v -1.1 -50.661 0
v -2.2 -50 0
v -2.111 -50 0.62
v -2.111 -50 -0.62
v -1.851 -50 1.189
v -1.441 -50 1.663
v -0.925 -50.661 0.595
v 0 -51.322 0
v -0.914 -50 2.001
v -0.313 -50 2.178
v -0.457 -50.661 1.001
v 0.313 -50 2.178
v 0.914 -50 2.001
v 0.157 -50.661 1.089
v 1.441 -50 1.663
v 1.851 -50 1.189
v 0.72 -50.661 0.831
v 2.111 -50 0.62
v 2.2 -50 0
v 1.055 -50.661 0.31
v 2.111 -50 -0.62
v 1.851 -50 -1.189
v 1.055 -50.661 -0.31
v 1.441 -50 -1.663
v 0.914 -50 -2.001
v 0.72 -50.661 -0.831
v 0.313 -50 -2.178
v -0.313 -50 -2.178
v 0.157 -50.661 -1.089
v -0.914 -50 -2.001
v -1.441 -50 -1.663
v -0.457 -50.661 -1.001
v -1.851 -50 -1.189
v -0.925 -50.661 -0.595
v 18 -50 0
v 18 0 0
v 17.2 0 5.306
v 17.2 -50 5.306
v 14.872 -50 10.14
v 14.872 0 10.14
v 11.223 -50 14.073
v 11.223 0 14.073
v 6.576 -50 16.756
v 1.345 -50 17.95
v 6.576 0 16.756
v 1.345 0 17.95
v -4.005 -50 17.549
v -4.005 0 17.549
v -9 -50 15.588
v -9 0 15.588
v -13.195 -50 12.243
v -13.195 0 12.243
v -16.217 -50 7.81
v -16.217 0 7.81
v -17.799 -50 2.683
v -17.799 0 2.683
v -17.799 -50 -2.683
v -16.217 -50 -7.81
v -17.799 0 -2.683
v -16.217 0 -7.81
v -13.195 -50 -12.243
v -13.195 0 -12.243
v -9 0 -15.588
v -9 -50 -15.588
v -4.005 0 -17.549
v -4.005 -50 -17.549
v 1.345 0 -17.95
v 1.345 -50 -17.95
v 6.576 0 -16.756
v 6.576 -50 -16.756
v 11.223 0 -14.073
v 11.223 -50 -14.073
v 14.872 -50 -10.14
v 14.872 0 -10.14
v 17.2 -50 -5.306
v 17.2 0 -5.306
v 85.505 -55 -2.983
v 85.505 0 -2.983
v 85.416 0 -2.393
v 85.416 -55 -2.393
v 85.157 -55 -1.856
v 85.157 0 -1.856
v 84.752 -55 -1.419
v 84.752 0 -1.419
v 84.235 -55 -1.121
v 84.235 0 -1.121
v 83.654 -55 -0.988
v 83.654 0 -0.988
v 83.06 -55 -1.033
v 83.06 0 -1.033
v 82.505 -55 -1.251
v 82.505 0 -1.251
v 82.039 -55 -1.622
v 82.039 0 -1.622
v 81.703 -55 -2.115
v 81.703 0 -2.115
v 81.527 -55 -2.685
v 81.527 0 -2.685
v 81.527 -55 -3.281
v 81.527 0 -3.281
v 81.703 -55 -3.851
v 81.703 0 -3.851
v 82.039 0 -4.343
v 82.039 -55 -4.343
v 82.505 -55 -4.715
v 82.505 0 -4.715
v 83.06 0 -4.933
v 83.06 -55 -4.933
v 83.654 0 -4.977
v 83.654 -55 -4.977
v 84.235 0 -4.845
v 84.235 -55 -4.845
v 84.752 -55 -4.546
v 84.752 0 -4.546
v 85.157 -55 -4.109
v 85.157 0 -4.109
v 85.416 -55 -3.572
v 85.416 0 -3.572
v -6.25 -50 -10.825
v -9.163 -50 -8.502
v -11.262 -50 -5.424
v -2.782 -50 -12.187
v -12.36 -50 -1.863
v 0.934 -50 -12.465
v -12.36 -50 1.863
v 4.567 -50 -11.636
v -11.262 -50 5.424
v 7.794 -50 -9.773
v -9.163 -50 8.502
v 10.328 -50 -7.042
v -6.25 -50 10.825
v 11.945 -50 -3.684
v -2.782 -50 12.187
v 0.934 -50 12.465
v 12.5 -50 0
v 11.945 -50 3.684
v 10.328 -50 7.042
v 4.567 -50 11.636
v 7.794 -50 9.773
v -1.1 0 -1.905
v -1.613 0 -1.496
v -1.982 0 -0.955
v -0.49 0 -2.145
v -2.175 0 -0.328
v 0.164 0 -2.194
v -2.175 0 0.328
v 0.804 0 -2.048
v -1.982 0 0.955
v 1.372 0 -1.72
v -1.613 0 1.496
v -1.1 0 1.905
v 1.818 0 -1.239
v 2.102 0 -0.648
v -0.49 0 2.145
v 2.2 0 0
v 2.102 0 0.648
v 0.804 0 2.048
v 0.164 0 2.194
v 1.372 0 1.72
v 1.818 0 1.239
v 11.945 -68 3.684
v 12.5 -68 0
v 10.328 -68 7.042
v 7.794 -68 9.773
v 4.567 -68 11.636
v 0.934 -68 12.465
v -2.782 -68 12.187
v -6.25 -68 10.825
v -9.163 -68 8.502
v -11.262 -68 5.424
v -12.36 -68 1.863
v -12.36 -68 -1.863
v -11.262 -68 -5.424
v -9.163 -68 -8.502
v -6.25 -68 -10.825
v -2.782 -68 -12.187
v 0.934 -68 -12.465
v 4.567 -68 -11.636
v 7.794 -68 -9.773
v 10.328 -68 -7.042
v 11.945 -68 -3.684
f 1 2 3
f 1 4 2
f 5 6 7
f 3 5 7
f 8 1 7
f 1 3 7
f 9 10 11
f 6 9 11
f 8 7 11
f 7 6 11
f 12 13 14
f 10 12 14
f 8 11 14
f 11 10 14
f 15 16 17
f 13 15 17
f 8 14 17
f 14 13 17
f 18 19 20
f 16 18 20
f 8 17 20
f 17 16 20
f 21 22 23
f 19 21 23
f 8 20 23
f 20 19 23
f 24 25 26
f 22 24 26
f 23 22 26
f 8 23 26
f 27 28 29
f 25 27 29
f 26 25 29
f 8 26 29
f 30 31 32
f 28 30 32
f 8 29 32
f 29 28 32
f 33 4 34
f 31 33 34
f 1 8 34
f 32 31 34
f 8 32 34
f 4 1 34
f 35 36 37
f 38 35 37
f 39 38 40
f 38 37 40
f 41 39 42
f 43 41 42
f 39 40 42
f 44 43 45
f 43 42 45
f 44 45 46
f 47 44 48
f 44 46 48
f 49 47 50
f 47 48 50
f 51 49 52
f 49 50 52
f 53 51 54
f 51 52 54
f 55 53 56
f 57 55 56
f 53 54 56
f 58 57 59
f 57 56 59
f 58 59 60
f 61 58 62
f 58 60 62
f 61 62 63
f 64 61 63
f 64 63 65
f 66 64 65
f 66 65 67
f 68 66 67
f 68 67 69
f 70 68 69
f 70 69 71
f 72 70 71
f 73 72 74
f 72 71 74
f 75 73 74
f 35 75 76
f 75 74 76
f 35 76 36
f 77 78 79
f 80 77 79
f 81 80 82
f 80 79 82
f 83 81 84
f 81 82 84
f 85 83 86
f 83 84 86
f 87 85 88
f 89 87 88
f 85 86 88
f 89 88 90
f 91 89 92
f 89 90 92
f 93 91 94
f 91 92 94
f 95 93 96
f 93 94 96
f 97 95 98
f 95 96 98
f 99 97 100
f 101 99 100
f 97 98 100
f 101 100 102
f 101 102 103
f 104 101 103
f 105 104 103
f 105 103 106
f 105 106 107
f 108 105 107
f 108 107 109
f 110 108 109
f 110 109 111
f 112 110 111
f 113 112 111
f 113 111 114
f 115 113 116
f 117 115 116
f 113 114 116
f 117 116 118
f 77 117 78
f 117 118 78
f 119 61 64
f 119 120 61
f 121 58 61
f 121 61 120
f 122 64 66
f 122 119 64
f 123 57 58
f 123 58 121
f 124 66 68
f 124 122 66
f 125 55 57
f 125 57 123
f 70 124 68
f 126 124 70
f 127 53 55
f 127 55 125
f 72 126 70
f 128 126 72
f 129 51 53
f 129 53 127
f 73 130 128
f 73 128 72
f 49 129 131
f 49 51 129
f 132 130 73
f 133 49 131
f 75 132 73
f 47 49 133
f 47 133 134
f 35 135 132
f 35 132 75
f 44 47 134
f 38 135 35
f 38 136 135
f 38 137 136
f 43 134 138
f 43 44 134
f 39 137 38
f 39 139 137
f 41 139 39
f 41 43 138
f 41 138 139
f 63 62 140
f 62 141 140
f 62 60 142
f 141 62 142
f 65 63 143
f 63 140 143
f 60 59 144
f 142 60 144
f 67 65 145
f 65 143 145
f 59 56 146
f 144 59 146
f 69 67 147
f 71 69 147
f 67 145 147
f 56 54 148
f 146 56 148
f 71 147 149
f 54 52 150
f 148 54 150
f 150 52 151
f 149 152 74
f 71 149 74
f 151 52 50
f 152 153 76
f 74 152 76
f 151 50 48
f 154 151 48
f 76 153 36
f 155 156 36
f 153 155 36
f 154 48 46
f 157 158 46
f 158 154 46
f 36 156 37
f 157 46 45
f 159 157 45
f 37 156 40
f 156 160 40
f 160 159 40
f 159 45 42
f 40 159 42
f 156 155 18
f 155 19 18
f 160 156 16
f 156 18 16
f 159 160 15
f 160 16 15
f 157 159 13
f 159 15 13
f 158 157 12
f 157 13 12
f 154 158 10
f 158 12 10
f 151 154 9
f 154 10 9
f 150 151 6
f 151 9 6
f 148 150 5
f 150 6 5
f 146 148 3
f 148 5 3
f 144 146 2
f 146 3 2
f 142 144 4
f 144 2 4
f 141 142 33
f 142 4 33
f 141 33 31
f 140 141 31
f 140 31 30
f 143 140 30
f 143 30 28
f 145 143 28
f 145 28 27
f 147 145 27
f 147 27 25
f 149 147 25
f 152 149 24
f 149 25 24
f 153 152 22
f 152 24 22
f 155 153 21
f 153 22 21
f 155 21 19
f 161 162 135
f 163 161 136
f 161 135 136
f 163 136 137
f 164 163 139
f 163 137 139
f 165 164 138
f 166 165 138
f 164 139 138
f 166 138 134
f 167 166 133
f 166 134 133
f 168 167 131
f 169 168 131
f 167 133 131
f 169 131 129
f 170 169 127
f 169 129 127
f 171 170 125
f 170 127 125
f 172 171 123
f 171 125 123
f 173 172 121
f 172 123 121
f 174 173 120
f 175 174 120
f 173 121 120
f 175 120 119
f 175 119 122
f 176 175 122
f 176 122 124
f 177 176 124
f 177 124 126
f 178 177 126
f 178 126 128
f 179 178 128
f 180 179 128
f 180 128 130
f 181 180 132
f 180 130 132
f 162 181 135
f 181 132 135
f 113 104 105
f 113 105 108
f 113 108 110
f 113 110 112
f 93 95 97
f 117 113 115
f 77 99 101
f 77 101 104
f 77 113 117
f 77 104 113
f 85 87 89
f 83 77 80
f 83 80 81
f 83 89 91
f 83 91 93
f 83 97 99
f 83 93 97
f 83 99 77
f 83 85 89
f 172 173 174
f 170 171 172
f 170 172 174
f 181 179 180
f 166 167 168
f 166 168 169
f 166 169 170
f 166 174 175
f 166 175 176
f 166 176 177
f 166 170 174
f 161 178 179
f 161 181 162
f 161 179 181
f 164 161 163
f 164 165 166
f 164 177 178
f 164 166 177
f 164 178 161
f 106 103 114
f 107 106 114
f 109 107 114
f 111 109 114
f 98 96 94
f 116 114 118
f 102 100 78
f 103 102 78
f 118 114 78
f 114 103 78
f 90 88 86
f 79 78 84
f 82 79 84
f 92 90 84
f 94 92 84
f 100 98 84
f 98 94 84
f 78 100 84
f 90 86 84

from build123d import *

# Parameters (mm, degrees)
F0_R     = 18
F1_DEPTH = 50
F2_R     = 12.5
F3_DEPTH = 18
F5_D     = 4.4
F5_DEPTH = 50
F5_TIP   = 1.3218933619
F6_R     = 2
F7_DEPTH = 55


with BuildPart() as f1:
    # F0 (on Front) → F1 (new body)
    with BuildSketch(Plane.XZ):
        Circle(F0_R)
    extrude(amount=F1_DEPTH)

    # F2 (on face) → F3 (join)
    with BuildSketch(Plane.XZ.offset(50)):
        Circle(F2_R)
    extrude(amount=F3_DEPTH)

    # F5
    with Locations(Plane(origin=(0, 0, 0), x_dir=(-1, 0, 0), z_dir=(0, 1, 0))):
        with Locations((0, 0)):
            Hole(F5_D / 2, depth=F5_DEPTH)
            with Locations((0, 0, -(F5_DEPTH + F5_TIP / 2))):  # 118° drill point
                Cone(0, F5_D / 2, F5_TIP, mode=Mode.SUBTRACT)


with BuildPart() as f7:
    # F6 (on Front) → F7 (new body)
    with BuildSketch(Plane.XZ):
        with Locations((83.5047364235, -2.9828166589)):
            Circle(F6_R)
    extrude(amount=F7_DEPTH)


solid = Compound([f1.part, f7.part])
